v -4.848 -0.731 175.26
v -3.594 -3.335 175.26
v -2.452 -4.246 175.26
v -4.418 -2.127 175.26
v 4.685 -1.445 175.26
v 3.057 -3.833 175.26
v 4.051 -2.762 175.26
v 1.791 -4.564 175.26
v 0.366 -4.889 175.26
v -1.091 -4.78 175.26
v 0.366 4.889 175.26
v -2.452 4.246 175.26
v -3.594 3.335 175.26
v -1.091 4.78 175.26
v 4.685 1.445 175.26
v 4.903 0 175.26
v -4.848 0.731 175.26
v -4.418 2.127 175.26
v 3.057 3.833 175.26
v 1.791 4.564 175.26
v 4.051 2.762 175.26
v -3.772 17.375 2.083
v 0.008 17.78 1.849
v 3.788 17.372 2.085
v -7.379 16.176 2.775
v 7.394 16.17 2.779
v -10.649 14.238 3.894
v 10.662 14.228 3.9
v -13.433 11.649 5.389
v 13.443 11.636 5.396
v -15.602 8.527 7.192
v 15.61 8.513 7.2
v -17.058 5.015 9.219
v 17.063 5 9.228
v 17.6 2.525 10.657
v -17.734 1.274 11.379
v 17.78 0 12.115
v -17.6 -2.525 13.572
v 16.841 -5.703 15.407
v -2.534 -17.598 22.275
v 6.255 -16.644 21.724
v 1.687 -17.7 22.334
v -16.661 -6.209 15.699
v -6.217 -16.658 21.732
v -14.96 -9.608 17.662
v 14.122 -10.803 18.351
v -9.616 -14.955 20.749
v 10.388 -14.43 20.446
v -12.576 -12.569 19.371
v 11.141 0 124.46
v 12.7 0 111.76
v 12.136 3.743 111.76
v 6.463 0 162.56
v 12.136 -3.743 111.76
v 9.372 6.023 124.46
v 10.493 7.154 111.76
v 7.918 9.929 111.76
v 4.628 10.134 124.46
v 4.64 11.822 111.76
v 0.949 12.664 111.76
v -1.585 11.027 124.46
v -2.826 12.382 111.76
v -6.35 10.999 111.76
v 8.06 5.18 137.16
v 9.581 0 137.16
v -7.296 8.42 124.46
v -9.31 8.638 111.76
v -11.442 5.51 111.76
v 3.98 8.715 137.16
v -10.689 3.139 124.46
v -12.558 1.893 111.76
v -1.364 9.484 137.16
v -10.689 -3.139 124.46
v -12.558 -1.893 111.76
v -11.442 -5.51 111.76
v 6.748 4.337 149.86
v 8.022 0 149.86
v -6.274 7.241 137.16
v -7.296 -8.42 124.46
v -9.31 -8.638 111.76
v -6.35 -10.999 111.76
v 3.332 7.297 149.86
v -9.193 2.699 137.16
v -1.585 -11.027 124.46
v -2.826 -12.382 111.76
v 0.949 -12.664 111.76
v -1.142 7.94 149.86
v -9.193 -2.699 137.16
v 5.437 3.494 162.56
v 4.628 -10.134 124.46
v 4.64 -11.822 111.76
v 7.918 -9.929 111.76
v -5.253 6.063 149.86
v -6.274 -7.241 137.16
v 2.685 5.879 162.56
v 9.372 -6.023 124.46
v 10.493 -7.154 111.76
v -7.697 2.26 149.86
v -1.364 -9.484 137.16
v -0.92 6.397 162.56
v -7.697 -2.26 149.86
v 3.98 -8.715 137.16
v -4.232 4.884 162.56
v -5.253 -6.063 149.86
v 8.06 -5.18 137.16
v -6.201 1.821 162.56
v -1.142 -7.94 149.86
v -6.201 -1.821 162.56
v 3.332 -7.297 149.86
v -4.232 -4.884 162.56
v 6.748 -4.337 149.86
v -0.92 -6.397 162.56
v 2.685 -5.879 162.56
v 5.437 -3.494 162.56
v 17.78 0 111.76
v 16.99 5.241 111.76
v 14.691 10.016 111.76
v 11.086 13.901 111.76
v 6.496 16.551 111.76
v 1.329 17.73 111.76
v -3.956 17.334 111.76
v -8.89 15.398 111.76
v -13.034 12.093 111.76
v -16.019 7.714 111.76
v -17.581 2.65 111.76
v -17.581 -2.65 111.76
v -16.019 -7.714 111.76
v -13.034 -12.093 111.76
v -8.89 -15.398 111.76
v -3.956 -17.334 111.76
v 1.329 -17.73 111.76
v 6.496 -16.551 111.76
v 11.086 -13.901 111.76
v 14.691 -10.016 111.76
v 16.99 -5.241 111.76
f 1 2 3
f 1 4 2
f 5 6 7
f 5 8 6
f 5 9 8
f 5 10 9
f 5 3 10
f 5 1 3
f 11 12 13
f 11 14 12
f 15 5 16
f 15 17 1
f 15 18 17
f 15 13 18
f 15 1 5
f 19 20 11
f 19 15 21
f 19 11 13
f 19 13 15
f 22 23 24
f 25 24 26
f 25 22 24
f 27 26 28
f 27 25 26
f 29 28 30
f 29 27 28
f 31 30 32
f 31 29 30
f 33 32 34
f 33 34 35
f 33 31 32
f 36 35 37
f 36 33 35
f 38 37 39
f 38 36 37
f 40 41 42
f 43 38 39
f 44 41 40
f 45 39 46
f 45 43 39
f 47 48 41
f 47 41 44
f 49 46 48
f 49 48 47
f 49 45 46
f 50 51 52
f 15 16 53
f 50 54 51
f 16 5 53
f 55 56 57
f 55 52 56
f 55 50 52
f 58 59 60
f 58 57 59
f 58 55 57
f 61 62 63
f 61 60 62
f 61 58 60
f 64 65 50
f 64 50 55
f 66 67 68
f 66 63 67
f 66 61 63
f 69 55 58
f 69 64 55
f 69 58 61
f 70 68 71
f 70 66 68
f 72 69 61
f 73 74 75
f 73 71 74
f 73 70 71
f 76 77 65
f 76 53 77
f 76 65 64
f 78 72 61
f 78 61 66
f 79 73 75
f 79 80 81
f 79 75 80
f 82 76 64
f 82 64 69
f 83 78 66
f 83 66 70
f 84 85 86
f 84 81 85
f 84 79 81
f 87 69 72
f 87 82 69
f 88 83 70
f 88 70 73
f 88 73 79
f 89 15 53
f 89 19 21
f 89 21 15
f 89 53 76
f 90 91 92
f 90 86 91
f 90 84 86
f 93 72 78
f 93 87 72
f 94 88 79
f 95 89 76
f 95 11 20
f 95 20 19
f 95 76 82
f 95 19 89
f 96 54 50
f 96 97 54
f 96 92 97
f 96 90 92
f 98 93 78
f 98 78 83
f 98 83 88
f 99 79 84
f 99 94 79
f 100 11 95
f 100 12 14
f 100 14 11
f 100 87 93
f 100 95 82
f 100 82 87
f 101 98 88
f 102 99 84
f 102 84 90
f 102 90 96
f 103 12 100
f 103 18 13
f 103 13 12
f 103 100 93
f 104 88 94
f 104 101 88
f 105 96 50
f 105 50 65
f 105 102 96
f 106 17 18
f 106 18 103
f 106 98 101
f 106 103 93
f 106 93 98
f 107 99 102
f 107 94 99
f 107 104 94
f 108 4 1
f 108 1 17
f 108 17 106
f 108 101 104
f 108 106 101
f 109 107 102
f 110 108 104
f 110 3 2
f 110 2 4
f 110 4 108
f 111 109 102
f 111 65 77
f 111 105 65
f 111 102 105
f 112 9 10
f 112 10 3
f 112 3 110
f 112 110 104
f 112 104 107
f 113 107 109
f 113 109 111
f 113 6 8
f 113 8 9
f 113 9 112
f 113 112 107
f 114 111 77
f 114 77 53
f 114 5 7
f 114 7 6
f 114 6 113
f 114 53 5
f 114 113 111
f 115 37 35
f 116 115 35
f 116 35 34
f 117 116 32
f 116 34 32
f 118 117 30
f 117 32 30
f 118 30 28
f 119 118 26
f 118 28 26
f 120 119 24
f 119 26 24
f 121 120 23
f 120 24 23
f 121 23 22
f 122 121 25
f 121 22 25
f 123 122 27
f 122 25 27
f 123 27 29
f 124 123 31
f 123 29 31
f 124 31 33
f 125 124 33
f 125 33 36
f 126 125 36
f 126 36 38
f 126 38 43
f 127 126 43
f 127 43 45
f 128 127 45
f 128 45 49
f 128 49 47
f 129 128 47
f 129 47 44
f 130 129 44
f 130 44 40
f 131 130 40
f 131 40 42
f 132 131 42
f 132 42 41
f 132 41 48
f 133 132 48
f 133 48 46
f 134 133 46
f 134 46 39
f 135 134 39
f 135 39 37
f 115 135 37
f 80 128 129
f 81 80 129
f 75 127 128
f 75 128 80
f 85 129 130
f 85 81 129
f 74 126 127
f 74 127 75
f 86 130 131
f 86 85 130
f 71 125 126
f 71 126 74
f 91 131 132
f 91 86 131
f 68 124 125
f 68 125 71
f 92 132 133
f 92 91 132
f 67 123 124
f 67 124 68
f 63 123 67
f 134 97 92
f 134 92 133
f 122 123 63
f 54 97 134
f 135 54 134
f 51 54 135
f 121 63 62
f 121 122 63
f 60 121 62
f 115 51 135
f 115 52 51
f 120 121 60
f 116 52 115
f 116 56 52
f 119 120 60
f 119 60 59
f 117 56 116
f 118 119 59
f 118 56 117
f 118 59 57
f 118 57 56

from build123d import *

# Parameters (mm, degrees)
SKETCH1_R               = 17.78
BOSS_EXTRUDE1_DEPTH     = 111.76
SKETCH2_R               = 12.7
BOSS_EXTRUDE2_DEPTH     = 63.5
BOSS_EXTRUDE2_TAPER     = 7
CUT_EXTRUDE1_DEPTH      = 178.054580285
CUT_EXTRUDE1_DEPTH_BACK = 178.054580285


with BuildPart() as part:
    # Sketch1 → Boss-Extrude1 (new body)
    with BuildSketch(Plane.XY):
        Circle(SKETCH1_R)
    extrude(amount=BOSS_EXTRUDE1_DEPTH)

    # Sketch2 → Boss-Extrude2 (add)
    with BuildSketch(Plane.XY.offset(111.76)):
        Circle(SKETCH2_R)
    extrude(amount=BOSS_EXTRUDE2_DEPTH, taper=BOSS_EXTRUDE2_TAPER)

    # Sketch4 → Cut-Extrude1 (cut, two sides: drawn at the far end of the back side and taken through both)
    with BuildSketch(Plane(origin=(0, 0, 0), x_dir=(0, 0, -1), z_dir=(1, 0, 0)).offset(-CUT_EXTRUDE1_DEPTH_BACK)):
        Polygon((16.51, 49.579194367), (-26.426841821, -24.789597184), (59.446841821, -24.789597184), align=None)
    extrude(amount=CUT_EXTRUDE1_DEPTH + CUT_EXTRUDE1_DEPTH_BACK, mode=Mode.SUBTRACT)


solid = part.part
